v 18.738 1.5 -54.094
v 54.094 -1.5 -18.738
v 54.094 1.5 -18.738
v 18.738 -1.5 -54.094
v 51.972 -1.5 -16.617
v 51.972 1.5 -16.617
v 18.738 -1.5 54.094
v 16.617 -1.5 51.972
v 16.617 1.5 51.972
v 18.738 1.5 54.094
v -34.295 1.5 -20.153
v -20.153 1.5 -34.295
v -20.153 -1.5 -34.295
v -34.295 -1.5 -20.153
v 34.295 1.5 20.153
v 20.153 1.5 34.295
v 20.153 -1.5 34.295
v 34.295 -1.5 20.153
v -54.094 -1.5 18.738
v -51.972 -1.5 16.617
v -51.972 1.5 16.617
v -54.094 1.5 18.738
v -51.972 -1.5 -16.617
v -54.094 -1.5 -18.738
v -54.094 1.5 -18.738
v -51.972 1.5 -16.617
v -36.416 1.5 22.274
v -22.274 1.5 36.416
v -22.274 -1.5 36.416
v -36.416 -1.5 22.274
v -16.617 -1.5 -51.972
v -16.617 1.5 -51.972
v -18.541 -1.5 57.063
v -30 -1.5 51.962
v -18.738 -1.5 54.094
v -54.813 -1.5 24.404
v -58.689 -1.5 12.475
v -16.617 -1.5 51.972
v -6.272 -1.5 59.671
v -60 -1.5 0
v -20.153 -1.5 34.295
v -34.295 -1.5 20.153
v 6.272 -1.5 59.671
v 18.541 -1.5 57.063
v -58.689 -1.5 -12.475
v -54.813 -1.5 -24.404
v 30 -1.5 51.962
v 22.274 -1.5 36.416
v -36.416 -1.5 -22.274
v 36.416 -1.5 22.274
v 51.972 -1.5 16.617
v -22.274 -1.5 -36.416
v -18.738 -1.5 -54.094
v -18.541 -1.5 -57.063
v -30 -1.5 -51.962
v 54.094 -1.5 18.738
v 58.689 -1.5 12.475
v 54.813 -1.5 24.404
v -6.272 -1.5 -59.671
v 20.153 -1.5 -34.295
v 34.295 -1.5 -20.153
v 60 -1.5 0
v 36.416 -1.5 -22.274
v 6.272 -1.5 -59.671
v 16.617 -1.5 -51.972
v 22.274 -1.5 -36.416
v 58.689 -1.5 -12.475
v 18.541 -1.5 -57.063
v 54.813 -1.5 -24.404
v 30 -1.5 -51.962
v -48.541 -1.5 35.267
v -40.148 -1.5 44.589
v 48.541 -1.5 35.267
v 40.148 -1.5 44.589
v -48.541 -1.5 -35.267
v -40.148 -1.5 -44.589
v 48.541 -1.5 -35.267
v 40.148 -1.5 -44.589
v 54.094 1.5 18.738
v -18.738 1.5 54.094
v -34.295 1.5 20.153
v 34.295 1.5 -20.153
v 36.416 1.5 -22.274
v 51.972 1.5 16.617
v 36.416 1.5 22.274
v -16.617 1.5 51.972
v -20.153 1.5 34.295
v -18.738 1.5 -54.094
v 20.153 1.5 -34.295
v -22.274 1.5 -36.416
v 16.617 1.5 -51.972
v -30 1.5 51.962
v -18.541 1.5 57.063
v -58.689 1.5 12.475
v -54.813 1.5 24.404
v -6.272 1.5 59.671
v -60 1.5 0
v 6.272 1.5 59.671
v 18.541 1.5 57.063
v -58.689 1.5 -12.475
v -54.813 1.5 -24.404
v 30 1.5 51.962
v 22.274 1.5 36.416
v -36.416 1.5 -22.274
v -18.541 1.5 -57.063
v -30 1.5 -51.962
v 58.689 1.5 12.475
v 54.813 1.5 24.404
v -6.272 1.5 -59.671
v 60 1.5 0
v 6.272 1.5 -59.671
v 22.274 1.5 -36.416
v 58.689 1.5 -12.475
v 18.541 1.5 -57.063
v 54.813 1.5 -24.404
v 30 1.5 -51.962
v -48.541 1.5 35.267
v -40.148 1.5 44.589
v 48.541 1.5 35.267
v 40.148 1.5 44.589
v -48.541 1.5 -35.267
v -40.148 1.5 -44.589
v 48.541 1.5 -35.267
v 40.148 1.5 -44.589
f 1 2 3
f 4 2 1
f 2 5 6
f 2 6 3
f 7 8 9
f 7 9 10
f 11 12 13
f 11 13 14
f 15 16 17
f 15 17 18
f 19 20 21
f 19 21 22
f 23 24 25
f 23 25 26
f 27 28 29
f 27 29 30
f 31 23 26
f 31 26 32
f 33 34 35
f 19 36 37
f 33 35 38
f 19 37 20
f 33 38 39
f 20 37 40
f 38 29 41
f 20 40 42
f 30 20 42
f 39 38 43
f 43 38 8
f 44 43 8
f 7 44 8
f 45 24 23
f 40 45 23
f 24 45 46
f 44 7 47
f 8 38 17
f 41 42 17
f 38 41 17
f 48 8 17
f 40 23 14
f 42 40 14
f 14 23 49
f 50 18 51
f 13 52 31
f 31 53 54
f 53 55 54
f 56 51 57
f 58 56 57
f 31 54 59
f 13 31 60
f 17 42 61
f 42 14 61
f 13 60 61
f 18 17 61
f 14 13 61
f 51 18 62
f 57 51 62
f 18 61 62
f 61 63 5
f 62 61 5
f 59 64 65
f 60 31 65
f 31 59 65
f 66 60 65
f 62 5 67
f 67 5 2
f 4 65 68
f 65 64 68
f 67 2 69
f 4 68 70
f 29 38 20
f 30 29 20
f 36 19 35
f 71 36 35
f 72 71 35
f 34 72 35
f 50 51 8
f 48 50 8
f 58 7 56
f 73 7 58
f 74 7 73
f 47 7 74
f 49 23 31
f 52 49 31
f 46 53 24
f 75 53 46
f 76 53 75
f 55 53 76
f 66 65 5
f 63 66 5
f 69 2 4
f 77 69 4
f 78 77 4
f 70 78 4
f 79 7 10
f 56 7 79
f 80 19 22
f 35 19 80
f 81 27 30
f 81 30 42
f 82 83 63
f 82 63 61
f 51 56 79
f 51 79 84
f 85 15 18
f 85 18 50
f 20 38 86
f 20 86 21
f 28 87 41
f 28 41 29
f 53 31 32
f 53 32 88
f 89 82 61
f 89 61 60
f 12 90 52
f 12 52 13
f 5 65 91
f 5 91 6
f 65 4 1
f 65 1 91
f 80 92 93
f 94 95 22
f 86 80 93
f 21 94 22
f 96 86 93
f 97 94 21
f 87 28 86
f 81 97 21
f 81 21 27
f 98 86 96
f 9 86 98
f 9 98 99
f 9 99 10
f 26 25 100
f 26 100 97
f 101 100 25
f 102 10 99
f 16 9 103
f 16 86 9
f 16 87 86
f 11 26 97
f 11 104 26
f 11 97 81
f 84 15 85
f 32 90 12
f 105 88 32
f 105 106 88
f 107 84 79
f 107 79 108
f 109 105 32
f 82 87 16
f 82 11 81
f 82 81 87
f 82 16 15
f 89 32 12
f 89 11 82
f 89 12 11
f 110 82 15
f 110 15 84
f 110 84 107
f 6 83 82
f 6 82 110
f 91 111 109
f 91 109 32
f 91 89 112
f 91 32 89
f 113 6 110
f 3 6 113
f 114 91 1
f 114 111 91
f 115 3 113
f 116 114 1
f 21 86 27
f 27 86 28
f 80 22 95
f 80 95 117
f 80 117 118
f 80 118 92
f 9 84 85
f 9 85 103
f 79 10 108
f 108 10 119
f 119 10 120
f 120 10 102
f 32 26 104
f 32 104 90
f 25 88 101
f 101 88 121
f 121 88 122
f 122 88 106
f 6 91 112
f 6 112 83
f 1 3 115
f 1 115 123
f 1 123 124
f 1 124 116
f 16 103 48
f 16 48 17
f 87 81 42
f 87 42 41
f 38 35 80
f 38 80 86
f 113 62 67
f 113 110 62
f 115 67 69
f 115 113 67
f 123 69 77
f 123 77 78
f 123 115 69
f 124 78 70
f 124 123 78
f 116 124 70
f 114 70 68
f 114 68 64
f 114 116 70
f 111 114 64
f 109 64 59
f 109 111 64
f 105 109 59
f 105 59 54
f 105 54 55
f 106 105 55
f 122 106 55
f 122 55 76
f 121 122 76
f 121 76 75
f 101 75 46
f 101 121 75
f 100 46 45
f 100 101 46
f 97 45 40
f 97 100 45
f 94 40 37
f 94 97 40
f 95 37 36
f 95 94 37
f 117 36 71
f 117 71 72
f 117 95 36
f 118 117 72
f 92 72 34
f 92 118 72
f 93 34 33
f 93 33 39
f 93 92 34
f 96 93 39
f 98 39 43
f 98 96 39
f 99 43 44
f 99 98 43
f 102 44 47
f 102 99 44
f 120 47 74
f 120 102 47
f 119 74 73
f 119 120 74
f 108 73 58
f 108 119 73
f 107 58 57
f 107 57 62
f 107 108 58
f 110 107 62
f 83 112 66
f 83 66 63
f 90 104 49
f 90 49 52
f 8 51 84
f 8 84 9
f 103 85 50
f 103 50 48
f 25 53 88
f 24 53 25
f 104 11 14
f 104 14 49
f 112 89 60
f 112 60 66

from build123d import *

# Parameters (mm, degrees)
SKETCH1_R           = 60
BOSS_EXTRUDE1_DEPTH = 1.5
CUT_EXTRUDE3_START  = -4
CUT_EXTRUDE3_DEPTH  = 5
CIRPATTERN1_COUNT   = 4
CUT_EXTRUDE4_DEPTH  = 4
CIRPATTERN2_COUNT   = 4


with BuildPart() as part:
    # Sketch1 → Boss-Extrude1 (new body, symmetric)
    with BuildSketch(Plane(origin=(0, 0, 0), x_dir=(1, 0, 0), z_dir=(0, 1, 0))):
        Circle(SKETCH1_R)
    extrude(amount=BOSS_EXTRUDE1_DEPTH, both=True)

    # Sketch4 → Cut-Extrude3 (cut)
    with BuildSketch(Plane(origin=(0, 1.5, 0), x_dir=(1, 0, 0), z_dir=(0, 1, 0)).offset(CUT_EXTRUDE3_START)):
        Polygon((16.617009358, 51.972348417), (51.972348417, 16.617009358), (54.093668761, 18.738329701), (18.738329701, 54.093668761), align=None)
    cut_extrude3 = extrude(amount=CUT_EXTRUDE3_DEPTH, mode=Mode.SUBTRACT)

    # CirPattern1: Cut-Extrude3 ×4 about axis
    cirpattern1_axis = Axis((0, 0, 0), (0, 1, 0))
    for i in range(1, CIRPATTERN1_COUNT):
        add(cut_extrude3.rotate(cirpattern1_axis, i * 360 / CIRPATTERN1_COUNT), mode=Mode.SUBTRACT)

    # Sketch5 → Cut-Extrude4 (cut, through all)
    with BuildSketch(Plane(origin=(0, 1.5, 0), x_dir=(1, 0, 0), z_dir=(0, 1, 0))):
        Polygon((22.273863607, 36.415999231), (36.415999231, 22.273863607), (34.294678888, 20.152543264), (20.152543264, 34.294678888), align=None)
    cut_extrude4 = extrude(amount=-CUT_EXTRUDE4_DEPTH, mode=Mode.SUBTRACT)

    # CirPattern2: Cut-Extrude4 ×4 about axis
    cirpattern2_axis = Axis((0, 0, 0), (0, 1, 0))
    for i in range(1, CIRPATTERN2_COUNT):
        add(cut_extrude4.rotate(cirpattern2_axis, i * 360 / CIRPATTERN2_COUNT), mode=Mode.SUBTRACT)


solid = part.part
